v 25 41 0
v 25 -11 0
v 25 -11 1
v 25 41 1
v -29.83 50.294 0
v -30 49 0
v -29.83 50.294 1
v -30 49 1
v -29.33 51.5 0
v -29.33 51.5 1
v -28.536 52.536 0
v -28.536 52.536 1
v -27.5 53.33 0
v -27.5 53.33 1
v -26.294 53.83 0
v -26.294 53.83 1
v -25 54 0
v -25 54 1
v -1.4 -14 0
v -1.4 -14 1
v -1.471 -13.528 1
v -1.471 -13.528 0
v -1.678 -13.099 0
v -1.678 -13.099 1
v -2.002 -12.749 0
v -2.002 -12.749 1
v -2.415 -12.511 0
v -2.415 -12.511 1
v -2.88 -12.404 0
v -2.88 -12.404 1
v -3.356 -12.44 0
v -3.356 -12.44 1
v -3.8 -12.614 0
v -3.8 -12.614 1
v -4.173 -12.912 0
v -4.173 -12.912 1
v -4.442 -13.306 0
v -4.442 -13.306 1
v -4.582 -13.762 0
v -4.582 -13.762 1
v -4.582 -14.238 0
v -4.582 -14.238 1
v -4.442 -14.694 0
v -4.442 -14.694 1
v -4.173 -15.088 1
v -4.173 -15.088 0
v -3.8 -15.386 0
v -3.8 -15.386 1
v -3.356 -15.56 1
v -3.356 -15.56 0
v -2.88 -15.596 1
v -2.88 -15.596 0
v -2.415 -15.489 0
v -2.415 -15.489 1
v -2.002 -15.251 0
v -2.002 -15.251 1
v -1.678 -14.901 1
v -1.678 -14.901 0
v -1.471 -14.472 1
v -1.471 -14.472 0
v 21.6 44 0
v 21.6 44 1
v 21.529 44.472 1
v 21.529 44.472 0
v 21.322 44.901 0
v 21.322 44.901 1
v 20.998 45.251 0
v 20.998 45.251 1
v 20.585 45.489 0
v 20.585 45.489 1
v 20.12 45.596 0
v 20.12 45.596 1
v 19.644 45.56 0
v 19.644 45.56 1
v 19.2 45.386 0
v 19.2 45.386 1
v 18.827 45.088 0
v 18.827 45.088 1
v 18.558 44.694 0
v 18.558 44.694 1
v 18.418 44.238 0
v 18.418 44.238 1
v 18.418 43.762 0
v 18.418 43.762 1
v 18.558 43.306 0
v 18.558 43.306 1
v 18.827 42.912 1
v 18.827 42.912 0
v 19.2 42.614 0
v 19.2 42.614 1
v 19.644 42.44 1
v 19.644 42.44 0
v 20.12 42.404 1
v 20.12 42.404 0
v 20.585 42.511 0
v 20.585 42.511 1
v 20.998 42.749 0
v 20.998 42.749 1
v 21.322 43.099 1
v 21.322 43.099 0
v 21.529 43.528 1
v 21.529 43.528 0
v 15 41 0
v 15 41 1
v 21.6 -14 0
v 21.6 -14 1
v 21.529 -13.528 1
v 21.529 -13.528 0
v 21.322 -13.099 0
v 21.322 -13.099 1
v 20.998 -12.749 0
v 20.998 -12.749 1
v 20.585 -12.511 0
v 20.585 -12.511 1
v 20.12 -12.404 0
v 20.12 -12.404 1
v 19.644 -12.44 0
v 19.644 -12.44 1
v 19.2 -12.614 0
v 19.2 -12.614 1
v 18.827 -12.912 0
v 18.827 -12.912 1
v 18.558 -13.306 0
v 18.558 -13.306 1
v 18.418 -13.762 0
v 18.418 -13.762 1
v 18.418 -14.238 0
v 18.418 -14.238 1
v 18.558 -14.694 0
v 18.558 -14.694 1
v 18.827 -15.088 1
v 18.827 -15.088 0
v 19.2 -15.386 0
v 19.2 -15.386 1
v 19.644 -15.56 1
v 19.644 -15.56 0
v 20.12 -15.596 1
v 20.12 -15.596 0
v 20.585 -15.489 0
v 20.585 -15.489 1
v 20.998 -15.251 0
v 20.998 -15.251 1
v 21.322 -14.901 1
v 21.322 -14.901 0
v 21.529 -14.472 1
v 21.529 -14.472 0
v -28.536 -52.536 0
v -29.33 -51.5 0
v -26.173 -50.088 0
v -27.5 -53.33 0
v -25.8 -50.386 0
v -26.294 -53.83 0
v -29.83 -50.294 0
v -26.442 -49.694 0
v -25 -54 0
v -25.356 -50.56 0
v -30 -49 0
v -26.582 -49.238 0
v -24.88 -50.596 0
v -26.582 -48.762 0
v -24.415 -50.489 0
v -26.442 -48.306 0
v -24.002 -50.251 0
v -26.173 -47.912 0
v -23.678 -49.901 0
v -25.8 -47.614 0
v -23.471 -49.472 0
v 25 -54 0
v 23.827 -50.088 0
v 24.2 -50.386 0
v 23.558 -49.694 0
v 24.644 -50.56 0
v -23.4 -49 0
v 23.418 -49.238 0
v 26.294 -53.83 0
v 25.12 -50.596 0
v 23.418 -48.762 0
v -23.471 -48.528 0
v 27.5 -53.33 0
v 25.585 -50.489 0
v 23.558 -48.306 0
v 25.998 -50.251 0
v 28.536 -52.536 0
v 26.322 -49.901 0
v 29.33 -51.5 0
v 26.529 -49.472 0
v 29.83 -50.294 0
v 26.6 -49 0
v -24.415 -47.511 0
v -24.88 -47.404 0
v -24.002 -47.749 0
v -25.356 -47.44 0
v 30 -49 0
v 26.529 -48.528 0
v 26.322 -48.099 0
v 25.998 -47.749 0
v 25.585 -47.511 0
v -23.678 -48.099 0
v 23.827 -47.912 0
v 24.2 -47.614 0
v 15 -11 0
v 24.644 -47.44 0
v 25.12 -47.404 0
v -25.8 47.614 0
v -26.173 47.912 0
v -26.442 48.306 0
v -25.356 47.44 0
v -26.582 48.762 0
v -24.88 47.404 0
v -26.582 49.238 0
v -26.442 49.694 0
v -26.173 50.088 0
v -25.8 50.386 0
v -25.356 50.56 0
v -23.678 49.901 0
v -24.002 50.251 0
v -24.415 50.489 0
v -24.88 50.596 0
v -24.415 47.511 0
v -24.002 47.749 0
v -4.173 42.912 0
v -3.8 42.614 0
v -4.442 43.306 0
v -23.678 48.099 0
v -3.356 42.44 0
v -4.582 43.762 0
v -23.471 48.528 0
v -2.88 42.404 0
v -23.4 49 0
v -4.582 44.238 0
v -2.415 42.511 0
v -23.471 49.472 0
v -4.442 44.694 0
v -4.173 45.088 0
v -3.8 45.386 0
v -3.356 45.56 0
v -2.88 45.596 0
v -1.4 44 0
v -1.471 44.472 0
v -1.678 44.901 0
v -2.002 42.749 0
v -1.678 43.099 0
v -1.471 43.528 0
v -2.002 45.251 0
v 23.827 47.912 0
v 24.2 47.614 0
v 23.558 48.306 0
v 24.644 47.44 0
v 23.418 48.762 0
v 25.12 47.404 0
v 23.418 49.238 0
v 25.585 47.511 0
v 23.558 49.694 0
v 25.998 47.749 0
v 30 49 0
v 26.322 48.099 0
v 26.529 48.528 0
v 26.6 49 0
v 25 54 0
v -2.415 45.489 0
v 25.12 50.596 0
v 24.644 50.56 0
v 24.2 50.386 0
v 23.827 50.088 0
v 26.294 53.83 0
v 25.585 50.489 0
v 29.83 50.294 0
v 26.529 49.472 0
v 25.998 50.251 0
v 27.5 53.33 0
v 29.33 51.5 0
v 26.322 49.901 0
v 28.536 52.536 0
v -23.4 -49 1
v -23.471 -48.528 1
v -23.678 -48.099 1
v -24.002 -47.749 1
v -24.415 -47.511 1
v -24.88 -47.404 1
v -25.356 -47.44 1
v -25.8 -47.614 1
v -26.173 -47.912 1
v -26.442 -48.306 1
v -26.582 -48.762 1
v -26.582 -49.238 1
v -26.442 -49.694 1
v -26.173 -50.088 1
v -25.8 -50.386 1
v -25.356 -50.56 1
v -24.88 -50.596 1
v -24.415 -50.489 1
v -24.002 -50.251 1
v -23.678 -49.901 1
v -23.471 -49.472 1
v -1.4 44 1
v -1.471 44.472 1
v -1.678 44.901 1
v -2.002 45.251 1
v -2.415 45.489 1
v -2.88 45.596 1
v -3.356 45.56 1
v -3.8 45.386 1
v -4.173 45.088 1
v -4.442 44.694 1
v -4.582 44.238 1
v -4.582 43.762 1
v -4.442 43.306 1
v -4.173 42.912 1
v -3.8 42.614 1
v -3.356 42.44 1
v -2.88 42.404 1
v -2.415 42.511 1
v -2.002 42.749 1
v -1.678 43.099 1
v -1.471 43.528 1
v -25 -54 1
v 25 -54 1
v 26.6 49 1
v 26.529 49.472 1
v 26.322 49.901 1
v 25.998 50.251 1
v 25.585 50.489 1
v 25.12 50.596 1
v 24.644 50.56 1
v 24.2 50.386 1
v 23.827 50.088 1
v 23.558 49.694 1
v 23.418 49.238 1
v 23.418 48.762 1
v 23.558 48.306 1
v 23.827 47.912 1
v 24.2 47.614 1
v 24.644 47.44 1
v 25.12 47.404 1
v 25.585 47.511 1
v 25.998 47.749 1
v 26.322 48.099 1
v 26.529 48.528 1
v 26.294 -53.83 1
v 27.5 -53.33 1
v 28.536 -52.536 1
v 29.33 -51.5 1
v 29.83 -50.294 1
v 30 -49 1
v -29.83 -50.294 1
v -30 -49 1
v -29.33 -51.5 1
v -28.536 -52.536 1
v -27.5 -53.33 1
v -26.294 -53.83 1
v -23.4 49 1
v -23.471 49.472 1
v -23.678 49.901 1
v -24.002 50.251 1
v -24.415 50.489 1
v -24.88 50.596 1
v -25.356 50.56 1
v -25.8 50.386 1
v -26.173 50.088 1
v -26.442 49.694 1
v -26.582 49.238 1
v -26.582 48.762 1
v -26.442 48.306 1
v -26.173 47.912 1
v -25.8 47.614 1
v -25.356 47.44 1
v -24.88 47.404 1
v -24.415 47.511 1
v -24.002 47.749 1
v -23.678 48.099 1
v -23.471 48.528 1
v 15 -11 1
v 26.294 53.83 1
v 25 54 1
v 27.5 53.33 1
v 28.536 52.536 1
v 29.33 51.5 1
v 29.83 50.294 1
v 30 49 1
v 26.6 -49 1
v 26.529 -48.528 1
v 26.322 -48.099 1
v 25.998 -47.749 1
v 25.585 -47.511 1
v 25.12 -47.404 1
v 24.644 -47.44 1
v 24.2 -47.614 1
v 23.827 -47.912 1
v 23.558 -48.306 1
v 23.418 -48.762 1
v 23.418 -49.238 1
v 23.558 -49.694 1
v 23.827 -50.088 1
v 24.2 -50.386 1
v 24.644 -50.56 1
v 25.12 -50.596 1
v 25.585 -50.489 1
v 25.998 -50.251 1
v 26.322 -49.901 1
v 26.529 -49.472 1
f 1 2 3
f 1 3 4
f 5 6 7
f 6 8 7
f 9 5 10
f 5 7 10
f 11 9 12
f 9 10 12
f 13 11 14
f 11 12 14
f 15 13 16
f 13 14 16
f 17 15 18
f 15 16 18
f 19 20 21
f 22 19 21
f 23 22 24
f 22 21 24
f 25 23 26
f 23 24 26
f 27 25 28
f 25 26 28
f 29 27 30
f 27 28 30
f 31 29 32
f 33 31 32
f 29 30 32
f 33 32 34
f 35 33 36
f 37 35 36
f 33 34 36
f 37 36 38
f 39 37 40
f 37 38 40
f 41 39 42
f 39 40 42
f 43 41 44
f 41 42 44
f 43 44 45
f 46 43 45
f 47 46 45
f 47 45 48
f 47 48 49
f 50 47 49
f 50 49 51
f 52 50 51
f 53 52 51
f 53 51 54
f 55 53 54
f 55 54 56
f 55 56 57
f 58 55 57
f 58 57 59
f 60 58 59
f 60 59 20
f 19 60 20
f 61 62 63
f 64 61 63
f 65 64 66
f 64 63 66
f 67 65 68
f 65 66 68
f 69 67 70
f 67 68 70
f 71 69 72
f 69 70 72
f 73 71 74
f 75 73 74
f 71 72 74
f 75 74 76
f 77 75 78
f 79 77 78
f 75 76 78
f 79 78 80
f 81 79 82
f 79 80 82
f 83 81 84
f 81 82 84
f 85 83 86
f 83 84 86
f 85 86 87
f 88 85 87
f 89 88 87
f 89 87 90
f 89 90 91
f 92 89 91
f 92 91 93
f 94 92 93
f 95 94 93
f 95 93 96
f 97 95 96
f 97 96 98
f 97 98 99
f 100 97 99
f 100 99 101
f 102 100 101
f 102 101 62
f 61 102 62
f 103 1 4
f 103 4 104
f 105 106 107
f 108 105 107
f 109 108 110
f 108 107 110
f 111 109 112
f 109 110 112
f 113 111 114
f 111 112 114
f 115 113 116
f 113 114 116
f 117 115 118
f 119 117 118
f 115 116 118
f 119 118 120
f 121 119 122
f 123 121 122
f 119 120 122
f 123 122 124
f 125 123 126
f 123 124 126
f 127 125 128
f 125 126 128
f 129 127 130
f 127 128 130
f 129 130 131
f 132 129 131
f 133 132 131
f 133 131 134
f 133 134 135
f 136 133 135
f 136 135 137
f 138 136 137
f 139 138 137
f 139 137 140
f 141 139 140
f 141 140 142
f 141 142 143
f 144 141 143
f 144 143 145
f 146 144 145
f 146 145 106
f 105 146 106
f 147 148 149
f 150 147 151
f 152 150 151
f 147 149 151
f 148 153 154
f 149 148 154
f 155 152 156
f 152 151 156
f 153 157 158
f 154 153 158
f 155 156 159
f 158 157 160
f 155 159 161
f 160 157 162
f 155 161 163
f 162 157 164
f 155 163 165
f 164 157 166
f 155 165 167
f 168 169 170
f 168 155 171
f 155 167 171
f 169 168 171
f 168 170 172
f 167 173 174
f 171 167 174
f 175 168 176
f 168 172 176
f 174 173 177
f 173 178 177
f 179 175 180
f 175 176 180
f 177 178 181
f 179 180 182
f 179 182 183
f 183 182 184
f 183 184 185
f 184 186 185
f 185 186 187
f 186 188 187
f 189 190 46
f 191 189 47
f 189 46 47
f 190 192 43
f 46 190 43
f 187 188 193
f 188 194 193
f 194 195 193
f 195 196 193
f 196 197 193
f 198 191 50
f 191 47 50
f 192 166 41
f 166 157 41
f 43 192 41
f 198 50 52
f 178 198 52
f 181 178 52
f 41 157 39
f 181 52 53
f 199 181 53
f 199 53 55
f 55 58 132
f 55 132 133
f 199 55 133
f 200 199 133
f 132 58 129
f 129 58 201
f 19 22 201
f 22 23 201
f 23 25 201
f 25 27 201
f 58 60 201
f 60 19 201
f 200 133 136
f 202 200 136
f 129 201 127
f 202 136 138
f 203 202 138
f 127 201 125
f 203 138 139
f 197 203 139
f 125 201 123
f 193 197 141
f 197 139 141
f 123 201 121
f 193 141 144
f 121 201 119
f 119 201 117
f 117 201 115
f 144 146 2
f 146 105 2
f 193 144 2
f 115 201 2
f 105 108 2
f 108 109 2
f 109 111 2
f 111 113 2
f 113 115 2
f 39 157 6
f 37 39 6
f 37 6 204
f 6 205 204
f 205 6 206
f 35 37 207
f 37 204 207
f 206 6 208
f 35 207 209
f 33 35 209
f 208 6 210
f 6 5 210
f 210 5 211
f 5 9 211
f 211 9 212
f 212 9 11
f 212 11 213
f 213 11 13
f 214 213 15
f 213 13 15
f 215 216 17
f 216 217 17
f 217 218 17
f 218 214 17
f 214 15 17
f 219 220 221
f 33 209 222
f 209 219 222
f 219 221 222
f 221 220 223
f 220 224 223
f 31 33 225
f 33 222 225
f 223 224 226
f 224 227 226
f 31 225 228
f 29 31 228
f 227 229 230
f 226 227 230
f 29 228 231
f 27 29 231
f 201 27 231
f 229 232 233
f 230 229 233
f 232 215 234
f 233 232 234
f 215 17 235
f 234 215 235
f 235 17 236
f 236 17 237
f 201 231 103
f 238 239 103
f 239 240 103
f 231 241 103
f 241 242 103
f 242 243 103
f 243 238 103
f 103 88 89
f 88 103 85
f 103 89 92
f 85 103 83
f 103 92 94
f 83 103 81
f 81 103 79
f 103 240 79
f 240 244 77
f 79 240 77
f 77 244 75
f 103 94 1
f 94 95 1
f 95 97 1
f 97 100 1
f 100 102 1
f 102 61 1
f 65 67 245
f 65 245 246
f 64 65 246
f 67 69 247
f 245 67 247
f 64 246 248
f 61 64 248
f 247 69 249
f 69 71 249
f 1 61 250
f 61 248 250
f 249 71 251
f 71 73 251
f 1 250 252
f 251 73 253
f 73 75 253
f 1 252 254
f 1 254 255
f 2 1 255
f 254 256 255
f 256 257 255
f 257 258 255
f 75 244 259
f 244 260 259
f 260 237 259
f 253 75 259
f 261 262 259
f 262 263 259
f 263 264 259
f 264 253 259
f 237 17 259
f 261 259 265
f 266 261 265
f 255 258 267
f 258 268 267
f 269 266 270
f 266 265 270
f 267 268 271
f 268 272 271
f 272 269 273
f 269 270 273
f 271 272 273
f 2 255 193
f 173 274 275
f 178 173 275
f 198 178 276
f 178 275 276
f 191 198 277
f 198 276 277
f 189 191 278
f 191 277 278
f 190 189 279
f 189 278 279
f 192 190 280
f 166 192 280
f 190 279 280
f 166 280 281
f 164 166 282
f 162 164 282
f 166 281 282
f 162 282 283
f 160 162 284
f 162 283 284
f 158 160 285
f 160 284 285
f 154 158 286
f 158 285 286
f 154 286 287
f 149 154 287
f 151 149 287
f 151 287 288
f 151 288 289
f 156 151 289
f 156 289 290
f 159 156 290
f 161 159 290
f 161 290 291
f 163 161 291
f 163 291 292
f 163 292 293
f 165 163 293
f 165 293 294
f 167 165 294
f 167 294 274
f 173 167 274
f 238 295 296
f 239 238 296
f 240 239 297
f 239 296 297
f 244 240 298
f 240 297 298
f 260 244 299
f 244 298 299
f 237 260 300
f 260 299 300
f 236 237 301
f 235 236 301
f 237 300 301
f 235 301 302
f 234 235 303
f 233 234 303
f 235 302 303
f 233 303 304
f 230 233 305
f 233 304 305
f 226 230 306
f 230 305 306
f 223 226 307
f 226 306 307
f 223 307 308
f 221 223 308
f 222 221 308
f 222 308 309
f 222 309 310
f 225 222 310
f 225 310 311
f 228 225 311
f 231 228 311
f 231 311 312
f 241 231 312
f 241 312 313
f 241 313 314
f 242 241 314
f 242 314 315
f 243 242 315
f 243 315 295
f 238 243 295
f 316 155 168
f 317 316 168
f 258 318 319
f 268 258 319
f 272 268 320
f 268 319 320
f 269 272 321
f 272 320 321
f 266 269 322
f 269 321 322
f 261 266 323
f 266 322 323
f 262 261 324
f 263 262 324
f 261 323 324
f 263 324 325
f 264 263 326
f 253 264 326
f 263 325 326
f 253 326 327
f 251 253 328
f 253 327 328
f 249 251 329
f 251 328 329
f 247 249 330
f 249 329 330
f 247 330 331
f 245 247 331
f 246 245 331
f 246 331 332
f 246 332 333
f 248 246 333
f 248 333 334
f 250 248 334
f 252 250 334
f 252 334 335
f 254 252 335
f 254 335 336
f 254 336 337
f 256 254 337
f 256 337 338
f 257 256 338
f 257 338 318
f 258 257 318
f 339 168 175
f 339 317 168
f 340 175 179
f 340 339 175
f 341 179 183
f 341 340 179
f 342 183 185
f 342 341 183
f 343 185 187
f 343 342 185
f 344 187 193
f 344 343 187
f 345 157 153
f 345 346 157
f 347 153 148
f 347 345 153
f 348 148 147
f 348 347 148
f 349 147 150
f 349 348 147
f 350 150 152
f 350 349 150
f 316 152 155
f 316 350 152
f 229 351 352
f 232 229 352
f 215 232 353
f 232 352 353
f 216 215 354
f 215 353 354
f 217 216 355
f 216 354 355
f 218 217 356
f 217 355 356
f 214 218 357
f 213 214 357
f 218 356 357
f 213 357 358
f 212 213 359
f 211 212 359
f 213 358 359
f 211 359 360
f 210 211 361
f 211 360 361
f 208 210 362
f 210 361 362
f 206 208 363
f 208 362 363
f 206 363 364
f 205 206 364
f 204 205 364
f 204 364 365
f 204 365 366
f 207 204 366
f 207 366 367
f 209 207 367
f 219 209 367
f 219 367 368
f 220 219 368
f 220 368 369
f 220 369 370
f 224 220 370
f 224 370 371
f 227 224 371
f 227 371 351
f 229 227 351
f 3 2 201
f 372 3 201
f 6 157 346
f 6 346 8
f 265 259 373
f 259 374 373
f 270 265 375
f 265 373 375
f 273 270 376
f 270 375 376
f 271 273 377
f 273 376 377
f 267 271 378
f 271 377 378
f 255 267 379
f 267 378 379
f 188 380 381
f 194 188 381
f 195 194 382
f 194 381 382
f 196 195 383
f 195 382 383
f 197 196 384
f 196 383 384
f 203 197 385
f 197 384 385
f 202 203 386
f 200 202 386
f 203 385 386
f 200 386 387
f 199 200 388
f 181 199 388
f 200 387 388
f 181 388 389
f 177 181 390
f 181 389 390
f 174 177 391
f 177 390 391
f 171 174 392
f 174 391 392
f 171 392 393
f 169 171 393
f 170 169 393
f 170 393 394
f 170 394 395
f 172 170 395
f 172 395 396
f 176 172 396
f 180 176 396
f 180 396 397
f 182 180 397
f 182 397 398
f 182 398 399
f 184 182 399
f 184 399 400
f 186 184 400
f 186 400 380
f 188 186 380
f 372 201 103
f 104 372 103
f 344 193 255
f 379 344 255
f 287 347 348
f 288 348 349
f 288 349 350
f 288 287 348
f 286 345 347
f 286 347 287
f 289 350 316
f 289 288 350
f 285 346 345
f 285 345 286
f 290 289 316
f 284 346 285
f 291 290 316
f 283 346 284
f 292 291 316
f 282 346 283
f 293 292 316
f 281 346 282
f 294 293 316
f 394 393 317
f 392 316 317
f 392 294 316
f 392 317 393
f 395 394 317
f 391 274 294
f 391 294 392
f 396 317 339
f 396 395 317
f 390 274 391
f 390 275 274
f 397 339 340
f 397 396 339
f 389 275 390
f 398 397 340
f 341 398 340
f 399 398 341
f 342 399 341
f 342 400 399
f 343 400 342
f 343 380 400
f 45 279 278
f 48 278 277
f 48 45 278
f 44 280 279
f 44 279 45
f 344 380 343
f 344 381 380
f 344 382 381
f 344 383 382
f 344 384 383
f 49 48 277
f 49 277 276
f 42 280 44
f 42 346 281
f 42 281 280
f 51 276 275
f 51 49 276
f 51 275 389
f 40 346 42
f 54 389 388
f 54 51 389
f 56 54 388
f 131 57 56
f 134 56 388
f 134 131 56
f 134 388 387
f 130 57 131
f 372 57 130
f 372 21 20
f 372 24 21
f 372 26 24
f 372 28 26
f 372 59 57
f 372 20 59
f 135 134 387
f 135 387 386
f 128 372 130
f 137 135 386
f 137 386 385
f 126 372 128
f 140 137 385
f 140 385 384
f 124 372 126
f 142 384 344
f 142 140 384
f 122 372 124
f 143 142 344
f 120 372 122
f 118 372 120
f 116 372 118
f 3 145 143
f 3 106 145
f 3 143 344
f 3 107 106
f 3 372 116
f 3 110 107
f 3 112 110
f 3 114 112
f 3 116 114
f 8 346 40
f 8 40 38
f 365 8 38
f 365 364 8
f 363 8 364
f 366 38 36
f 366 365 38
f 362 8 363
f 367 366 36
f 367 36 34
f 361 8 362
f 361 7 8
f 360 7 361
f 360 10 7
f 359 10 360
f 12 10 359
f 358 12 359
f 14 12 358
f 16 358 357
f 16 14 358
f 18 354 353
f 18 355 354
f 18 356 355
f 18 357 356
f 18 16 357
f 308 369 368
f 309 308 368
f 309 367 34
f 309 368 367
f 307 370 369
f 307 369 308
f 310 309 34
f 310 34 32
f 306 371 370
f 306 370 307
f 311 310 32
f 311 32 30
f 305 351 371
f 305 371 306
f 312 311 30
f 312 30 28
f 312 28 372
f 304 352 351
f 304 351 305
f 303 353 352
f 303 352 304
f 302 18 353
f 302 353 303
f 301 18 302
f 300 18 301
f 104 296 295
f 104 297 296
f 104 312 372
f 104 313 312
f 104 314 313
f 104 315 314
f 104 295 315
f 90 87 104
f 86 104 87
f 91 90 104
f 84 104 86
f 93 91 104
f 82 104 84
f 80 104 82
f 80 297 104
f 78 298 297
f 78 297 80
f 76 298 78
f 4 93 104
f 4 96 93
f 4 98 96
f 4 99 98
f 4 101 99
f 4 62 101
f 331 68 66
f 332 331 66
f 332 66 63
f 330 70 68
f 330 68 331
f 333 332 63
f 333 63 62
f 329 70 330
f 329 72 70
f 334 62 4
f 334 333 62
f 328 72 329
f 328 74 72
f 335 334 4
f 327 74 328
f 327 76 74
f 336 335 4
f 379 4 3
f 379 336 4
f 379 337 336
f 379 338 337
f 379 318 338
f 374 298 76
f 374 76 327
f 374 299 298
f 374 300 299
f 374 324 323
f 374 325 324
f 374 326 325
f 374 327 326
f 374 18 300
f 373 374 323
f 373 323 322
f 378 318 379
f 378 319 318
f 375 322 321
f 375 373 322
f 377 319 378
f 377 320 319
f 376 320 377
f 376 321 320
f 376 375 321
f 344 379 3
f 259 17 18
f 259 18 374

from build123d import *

# Parameters (mm, degrees)
SKETCH_1_W          = 60
SKETCH_1_H          = 108
EXTRUDE_1_DEPTH     = 1
SKETCH_2_R          = 1.6
CUT_EXTRUDE_1_DEPTH = 5
SKETCH_4_R          = 1.6
CUT_EXTRUDE_3_DEPTH = 5
FILLET_1_R          = 5
SKETCH_5_W          = 10
SKETCH_5_H          = 52
CUT_EXTRUDE_4_DEPTH = 62.781874365


with BuildPart() as part:
    # ｽｹｯﾁ1 → ﾎﾞｽ - 押し出し1 (new body)
    with BuildSketch(Plane.XY):
        Rectangle(SKETCH_1_W, SKETCH_1_H)
    extrude(amount=EXTRUDE_1_DEPTH)

    # ｽｹｯﾁ2 → ｶｯﾄ - 押し出し1 (cut)
    with BuildSketch(Plane.XY.offset(1)):
        with Locations((-3, 44)):
            Circle(SKETCH_2_R)
        with Locations((20, 44)):
            Circle(SKETCH_2_R)
        with Locations((-3, -14)):
            Circle(SKETCH_2_R)
        with Locations((20, -14)):
            Circle(SKETCH_2_R)
    extrude(amount=-CUT_EXTRUDE_1_DEPTH, mode=Mode.SUBTRACT)

    # ｽｹｯﾁ4 → ｶｯﾄ - 押し出し3 (cut)
    with BuildSketch(Plane.XY.offset(1)):
        with Locations((-25, 49)):
            Circle(SKETCH_4_R)
        with Locations((25, 49)):
            Circle(SKETCH_4_R)
        with Locations((-25, -49)):
            Circle(SKETCH_4_R)
        with Locations((25, -49)):
            Circle(SKETCH_4_R)
    extrude(amount=-CUT_EXTRUDE_3_DEPTH, mode=Mode.SUBTRACT)

    # ﾌｨﾚｯﾄ1
    fillet_1_edges = [part.edges().sort_by_distance(p)[0] for p in [
        (30, -54, 0.5),
        (-30, -54, 0.5),
        (-30, 54, 0.5),
        (30, 54, 0.5),
    ]]
    fillet(fillet_1_edges, radius=FILLET_1_R)

    # ｽｹｯﾁ5 → ｶｯﾄ - 押し出し4 (cut, through all)
    with BuildSketch(Plane(origin=(0, 0, 0), x_dir=(-1, 0, 0), z_dir=(0, 0, -1))):
        with Locations((-20, 15)):
            Rectangle(SKETCH_5_W, SKETCH_5_H)
    extrude(amount=-CUT_EXTRUDE_4_DEPTH, mode=Mode.SUBTRACT)


solid = part.part
